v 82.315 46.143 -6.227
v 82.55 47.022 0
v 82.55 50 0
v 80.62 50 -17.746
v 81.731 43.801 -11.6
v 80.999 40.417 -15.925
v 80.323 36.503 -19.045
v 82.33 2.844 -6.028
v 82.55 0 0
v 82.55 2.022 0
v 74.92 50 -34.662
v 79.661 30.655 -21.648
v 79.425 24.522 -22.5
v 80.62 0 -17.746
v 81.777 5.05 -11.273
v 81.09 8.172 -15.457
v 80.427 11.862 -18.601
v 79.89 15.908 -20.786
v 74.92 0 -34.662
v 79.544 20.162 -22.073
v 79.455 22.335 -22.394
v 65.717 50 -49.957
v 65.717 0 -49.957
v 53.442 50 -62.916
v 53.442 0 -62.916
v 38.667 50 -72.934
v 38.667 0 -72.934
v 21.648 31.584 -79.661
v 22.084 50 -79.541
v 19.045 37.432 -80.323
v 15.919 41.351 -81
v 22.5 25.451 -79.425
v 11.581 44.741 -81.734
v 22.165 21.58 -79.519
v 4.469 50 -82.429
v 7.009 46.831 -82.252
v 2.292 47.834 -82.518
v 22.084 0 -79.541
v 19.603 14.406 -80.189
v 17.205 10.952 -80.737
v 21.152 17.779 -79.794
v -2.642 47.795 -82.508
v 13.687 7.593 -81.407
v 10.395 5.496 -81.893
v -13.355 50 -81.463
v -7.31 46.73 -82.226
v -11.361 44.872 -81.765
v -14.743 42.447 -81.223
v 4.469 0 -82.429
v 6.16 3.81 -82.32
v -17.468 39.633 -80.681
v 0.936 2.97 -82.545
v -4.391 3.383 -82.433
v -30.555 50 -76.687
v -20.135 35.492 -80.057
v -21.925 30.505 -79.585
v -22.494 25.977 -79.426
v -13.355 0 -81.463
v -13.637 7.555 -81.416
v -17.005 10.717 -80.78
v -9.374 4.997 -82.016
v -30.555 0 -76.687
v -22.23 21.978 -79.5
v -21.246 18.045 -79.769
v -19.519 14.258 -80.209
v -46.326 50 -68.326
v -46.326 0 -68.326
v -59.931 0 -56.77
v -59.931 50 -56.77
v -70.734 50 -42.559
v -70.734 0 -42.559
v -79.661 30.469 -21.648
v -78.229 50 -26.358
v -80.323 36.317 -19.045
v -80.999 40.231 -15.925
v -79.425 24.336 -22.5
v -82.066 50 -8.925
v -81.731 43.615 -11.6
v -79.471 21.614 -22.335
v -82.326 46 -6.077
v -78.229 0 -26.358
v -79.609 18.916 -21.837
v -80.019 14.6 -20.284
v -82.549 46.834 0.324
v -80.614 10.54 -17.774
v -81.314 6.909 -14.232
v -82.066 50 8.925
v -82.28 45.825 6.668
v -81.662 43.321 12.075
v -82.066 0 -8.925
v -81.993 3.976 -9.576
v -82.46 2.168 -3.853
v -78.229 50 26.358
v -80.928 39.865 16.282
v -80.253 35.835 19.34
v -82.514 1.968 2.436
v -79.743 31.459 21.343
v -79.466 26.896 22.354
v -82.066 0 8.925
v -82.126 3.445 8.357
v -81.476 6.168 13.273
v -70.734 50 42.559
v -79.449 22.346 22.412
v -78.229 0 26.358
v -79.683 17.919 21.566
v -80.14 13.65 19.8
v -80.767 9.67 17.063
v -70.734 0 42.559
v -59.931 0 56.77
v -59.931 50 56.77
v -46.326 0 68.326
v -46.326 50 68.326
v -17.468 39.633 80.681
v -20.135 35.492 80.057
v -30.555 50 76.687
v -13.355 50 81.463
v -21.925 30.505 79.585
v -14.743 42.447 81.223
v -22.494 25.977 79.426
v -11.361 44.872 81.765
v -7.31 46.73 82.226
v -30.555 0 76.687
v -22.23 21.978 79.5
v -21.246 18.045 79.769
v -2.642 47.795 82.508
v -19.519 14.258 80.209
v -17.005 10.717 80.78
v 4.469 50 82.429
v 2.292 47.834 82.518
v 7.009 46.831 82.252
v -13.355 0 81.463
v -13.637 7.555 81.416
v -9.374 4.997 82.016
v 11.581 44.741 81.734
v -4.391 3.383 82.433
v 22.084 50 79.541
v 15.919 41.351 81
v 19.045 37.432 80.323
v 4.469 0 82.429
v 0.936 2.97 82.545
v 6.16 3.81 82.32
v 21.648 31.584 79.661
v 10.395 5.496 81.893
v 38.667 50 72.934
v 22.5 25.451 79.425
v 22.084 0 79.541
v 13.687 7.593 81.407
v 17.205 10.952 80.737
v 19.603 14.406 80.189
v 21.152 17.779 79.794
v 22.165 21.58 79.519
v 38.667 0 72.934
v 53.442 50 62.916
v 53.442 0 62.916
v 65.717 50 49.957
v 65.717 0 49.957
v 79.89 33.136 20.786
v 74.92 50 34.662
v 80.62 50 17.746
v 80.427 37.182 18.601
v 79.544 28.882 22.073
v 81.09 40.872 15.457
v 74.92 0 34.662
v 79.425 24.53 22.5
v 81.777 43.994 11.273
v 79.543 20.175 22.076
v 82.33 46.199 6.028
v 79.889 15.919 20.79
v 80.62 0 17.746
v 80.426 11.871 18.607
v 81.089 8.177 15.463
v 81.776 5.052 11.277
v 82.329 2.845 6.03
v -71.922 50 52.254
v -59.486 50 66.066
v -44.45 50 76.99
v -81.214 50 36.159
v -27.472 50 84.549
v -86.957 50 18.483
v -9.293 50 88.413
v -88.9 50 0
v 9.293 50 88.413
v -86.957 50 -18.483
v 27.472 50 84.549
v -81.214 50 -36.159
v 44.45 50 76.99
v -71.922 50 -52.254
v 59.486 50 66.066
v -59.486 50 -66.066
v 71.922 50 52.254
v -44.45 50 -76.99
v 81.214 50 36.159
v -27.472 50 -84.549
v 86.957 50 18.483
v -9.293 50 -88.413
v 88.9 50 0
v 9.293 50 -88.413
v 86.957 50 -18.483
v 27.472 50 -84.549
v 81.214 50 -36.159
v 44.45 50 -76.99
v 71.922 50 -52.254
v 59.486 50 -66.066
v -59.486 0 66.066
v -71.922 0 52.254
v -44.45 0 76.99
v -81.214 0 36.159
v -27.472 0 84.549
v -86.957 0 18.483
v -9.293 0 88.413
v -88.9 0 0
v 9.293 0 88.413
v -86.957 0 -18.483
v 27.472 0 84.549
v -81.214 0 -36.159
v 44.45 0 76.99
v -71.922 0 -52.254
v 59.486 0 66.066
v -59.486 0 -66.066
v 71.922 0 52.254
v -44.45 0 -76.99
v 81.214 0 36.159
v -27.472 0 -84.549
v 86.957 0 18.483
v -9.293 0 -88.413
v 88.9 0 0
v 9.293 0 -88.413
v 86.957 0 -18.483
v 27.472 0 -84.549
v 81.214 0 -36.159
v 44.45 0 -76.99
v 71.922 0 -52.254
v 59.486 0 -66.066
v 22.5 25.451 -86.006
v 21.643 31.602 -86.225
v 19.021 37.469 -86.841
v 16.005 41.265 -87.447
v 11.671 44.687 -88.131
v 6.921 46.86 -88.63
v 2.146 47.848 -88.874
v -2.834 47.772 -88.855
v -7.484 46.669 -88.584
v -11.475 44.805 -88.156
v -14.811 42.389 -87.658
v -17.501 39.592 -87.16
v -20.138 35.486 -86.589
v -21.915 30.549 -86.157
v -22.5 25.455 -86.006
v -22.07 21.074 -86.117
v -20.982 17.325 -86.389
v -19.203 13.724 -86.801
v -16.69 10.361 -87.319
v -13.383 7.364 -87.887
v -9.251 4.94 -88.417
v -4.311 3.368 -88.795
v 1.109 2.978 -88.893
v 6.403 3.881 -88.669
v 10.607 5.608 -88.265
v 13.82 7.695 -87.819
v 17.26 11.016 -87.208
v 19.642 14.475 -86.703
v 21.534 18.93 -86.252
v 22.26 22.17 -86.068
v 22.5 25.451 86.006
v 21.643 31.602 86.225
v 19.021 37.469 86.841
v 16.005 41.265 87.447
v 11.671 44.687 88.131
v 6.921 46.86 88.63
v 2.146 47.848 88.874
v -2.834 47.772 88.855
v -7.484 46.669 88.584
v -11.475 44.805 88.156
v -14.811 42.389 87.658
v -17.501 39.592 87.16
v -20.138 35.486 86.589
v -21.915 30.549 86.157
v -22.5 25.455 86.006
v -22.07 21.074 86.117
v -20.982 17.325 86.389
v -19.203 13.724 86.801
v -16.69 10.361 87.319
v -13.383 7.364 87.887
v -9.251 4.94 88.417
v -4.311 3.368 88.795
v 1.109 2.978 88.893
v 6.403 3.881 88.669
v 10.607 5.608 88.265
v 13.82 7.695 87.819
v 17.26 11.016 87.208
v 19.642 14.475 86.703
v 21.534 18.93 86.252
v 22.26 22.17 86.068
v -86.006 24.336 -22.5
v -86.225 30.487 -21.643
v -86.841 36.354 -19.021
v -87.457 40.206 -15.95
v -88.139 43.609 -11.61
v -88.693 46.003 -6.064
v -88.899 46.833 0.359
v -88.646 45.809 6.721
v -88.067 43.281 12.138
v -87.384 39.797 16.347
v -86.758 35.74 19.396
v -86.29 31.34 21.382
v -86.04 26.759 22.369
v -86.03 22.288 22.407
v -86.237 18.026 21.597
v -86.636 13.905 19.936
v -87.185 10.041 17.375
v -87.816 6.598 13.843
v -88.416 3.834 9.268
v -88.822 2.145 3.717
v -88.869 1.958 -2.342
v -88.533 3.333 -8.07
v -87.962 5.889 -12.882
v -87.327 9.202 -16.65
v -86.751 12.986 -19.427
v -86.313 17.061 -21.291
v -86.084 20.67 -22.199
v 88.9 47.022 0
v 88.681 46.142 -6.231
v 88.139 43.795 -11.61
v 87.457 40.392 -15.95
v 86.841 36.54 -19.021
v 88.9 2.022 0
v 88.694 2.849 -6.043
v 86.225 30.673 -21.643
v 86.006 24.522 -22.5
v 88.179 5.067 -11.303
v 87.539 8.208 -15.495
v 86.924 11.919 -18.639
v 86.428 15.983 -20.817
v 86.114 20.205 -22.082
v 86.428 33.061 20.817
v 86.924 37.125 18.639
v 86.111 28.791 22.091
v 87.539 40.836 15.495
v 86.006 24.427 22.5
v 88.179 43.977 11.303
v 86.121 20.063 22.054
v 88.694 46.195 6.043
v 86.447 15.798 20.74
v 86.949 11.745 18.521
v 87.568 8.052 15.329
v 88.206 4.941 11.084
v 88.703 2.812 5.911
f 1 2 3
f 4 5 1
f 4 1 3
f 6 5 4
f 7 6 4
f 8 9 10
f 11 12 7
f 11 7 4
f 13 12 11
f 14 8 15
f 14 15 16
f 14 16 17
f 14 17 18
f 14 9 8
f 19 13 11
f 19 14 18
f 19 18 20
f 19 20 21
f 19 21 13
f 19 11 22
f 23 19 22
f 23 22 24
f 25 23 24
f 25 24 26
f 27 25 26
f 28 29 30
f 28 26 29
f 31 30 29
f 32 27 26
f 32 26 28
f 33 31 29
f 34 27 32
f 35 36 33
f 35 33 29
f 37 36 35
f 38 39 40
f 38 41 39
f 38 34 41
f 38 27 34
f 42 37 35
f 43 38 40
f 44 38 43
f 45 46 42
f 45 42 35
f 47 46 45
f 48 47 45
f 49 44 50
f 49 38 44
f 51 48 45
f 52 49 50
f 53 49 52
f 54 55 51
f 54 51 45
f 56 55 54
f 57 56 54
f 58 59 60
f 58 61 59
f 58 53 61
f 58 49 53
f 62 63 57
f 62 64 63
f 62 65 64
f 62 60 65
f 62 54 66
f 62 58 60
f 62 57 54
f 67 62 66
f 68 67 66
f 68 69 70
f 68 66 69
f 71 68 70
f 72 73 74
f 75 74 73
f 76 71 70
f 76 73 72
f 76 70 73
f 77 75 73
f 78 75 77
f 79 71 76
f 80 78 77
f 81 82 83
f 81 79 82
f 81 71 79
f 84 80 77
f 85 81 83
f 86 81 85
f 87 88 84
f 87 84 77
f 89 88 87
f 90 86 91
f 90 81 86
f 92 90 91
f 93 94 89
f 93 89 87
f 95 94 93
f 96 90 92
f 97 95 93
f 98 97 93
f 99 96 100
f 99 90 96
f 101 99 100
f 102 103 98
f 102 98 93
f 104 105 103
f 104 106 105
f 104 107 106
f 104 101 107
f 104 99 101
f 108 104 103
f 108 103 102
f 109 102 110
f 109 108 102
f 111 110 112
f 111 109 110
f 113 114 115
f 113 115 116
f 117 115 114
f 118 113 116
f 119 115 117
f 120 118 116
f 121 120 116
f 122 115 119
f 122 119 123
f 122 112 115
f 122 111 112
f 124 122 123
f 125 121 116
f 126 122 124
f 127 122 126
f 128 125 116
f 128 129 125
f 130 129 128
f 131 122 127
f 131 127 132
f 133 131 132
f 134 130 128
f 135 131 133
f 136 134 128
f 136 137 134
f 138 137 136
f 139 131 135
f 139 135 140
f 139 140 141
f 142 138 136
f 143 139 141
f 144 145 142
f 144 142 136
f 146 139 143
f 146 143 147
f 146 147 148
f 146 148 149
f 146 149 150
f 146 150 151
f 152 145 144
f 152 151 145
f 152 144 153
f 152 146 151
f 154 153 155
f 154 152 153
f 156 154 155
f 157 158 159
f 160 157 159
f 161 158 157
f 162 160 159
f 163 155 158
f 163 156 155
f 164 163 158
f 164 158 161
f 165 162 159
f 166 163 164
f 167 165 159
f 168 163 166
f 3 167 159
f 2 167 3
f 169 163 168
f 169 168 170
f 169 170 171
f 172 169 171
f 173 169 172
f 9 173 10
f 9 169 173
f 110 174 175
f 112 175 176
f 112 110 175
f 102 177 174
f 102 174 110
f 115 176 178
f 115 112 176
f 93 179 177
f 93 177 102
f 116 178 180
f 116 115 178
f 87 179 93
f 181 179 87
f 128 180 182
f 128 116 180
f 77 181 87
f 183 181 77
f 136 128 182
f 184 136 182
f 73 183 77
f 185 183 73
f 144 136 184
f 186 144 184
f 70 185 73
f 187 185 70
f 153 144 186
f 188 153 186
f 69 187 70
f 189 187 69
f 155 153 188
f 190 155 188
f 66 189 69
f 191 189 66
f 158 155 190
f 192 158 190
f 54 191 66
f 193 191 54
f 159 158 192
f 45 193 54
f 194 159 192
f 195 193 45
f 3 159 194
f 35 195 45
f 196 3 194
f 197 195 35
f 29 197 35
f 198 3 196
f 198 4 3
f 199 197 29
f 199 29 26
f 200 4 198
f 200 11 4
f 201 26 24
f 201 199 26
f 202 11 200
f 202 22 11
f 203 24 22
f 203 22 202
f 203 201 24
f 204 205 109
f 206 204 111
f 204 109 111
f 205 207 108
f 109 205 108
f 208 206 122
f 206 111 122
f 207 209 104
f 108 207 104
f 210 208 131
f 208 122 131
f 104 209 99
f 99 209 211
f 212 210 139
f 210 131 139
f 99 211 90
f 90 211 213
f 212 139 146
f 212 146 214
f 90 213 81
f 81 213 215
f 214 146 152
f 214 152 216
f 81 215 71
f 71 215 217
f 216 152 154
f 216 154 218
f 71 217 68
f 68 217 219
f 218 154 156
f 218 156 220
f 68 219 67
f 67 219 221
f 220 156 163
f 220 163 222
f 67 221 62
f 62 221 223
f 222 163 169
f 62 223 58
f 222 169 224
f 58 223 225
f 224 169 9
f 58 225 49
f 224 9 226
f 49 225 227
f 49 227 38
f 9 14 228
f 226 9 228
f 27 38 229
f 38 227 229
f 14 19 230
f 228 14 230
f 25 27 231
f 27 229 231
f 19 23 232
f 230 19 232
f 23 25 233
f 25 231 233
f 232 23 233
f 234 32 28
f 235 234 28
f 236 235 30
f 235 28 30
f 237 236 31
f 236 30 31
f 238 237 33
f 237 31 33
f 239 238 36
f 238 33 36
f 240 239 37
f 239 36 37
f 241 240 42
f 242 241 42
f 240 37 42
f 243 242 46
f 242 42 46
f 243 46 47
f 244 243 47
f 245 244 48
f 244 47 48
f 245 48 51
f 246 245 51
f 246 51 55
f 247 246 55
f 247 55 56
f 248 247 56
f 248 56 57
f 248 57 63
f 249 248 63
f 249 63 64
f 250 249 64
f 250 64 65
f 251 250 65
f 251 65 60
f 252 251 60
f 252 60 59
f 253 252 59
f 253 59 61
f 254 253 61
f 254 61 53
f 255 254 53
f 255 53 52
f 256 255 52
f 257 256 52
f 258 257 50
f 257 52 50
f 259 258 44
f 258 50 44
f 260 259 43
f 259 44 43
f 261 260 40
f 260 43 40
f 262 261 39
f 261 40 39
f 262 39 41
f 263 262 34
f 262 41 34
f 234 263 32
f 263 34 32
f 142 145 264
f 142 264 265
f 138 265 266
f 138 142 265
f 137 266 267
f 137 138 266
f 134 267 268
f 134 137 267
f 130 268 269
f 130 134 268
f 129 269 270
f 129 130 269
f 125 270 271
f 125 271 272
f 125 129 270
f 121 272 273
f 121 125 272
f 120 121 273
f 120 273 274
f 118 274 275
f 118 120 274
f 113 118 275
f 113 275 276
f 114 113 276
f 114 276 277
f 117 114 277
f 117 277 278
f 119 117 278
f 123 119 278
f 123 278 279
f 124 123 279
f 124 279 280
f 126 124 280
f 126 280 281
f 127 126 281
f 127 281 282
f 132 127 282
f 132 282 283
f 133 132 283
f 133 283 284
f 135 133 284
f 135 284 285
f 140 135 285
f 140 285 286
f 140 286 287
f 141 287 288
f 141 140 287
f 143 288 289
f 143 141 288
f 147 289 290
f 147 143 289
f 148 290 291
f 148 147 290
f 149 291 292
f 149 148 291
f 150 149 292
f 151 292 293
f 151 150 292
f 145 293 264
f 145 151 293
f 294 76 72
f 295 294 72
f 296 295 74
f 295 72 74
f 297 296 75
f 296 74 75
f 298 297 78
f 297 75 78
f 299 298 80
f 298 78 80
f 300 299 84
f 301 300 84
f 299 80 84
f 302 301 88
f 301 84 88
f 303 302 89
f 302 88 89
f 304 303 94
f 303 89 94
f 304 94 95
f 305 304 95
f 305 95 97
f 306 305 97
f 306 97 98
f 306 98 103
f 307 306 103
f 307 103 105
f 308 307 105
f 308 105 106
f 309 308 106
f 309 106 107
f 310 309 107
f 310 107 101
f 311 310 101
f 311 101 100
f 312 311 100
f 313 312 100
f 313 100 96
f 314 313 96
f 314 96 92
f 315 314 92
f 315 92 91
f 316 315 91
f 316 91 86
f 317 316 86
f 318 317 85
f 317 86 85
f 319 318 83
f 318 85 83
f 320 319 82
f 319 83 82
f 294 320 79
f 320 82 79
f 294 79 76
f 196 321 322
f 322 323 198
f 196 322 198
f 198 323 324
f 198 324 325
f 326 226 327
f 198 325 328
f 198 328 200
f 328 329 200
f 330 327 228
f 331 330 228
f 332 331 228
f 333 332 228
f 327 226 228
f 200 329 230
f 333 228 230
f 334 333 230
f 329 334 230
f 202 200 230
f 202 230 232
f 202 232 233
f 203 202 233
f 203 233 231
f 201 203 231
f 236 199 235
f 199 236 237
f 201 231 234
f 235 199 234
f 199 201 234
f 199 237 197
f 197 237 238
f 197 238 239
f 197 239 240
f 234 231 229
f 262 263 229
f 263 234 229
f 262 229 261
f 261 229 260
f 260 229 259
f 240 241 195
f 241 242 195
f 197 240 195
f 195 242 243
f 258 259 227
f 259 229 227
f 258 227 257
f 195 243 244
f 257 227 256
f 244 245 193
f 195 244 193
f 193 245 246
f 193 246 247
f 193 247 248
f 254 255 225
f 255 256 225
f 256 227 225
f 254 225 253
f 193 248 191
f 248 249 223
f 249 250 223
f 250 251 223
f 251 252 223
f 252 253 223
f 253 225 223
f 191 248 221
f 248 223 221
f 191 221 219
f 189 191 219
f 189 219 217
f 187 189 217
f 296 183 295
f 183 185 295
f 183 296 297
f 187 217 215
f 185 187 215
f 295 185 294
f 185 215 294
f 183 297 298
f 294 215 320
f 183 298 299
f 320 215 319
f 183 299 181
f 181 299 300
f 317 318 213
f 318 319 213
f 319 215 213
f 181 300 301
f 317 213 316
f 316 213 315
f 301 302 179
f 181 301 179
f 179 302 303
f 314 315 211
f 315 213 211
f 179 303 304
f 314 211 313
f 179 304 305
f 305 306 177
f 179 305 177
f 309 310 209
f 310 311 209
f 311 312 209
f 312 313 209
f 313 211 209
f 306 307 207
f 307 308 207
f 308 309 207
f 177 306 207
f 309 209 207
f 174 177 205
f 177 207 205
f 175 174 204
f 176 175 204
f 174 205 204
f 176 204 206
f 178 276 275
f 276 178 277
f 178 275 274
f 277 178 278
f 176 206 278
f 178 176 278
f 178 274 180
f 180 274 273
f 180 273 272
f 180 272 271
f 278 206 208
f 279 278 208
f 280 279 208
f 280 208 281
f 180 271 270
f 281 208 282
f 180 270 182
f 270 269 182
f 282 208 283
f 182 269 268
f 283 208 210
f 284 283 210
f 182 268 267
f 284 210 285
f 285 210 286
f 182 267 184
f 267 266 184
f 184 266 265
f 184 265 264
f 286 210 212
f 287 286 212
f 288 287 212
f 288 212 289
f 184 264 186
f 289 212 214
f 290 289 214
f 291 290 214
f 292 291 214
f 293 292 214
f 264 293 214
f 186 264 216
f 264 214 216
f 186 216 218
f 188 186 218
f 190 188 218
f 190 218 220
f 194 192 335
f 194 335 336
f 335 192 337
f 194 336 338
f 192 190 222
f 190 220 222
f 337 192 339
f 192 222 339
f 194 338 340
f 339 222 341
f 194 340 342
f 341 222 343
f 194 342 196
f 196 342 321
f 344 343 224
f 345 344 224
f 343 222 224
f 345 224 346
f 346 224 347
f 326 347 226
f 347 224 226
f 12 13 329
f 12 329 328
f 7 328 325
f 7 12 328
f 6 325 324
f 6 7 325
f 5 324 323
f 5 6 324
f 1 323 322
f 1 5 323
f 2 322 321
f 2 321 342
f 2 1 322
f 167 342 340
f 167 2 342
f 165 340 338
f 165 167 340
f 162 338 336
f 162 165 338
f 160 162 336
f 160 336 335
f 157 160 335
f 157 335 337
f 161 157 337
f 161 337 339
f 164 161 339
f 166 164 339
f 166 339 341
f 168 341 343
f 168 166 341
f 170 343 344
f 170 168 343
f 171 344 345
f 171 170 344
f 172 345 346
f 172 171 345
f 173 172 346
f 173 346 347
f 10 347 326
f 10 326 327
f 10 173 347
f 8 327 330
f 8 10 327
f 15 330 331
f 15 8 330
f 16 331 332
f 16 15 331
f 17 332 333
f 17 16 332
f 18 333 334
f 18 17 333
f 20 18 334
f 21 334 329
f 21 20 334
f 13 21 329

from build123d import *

# Parameters (mm, degrees)
SKETCH1_R           = 88.9
BOSS_EXTRUDE1_DEPTH = 50
SKETCH2_R           = 82.55
CUT_EXTRUDE4_DEPTH  = 74
SKETCH12_R          = 22.5
CUT_EXTRUDE5_DEPTH  = 115.64
SKETCH13_R          = 22.5
CUT_EXTRUDE6_DEPTH  = 115.64
SKETCH14_R          = 22.5
CUT_EXTRUDE7_DEPTH  = 99.64
CUT_EXTRUDE8_START  = 137.64
SKETCH15_R          = 22.5
CUT_EXTRUDE8_DEPTH  = 137.64


with BuildPart() as part:
    # Sketch1 → Boss-Extrude1 (new body)
    with BuildSketch(Plane(origin=(0, 0, 0), x_dir=(1, 0, 0), z_dir=(0, 1, 0))):
        Circle(SKETCH1_R)
    extrude(amount=BOSS_EXTRUDE1_DEPTH)

    # Sketch2 → Cut-Extrude4 (cut)
    with BuildSketch(Plane(origin=(0, 0, 0), x_dir=(1, 0, 0), z_dir=(0, 1, 0))):
        Circle(SKETCH2_R)
    extrude(amount=CUT_EXTRUDE4_DEPTH, mode=Mode.SUBTRACT)

    # Sketch12 → Cut-Extrude5 (cut)
    with BuildSketch(Plane(origin=(0, 0, 0), x_dir=(0, 0, -1), z_dir=(1, 0, 0))):
        with Locations((0, 24.336091646)):
            Circle(SKETCH12_R)
    extrude(amount=-CUT_EXTRUDE5_DEPTH, mode=Mode.SUBTRACT)

    # Sketch13 → Cut-Extrude6 (cut)
    with BuildSketch(Plane.XY):
        with Locations((0, 25.450721797)):
            Circle(SKETCH13_R)
    extrude(amount=-CUT_EXTRUDE6_DEPTH, mode=Mode.SUBTRACT)

    # Sketch14 → Cut-Extrude7 (cut)
    with BuildSketch(Plane(origin=(0, 0, 0), x_dir=(0, 0, -1), z_dir=(1, 0, 0))):
        with Locations((0, 24.521863338)):
            Circle(SKETCH14_R)
    extrude(amount=CUT_EXTRUDE7_DEPTH, mode=Mode.SUBTRACT)

    # Sketch15 → Cut-Extrude8 (cut)
    with BuildSketch(Plane.XY.offset(CUT_EXTRUDE8_START)):
        with Locations((0, 25.450721797)):
            Circle(SKETCH15_R)
    extrude(amount=-CUT_EXTRUDE8_DEPTH, mode=Mode.SUBTRACT)


solid = part.part
